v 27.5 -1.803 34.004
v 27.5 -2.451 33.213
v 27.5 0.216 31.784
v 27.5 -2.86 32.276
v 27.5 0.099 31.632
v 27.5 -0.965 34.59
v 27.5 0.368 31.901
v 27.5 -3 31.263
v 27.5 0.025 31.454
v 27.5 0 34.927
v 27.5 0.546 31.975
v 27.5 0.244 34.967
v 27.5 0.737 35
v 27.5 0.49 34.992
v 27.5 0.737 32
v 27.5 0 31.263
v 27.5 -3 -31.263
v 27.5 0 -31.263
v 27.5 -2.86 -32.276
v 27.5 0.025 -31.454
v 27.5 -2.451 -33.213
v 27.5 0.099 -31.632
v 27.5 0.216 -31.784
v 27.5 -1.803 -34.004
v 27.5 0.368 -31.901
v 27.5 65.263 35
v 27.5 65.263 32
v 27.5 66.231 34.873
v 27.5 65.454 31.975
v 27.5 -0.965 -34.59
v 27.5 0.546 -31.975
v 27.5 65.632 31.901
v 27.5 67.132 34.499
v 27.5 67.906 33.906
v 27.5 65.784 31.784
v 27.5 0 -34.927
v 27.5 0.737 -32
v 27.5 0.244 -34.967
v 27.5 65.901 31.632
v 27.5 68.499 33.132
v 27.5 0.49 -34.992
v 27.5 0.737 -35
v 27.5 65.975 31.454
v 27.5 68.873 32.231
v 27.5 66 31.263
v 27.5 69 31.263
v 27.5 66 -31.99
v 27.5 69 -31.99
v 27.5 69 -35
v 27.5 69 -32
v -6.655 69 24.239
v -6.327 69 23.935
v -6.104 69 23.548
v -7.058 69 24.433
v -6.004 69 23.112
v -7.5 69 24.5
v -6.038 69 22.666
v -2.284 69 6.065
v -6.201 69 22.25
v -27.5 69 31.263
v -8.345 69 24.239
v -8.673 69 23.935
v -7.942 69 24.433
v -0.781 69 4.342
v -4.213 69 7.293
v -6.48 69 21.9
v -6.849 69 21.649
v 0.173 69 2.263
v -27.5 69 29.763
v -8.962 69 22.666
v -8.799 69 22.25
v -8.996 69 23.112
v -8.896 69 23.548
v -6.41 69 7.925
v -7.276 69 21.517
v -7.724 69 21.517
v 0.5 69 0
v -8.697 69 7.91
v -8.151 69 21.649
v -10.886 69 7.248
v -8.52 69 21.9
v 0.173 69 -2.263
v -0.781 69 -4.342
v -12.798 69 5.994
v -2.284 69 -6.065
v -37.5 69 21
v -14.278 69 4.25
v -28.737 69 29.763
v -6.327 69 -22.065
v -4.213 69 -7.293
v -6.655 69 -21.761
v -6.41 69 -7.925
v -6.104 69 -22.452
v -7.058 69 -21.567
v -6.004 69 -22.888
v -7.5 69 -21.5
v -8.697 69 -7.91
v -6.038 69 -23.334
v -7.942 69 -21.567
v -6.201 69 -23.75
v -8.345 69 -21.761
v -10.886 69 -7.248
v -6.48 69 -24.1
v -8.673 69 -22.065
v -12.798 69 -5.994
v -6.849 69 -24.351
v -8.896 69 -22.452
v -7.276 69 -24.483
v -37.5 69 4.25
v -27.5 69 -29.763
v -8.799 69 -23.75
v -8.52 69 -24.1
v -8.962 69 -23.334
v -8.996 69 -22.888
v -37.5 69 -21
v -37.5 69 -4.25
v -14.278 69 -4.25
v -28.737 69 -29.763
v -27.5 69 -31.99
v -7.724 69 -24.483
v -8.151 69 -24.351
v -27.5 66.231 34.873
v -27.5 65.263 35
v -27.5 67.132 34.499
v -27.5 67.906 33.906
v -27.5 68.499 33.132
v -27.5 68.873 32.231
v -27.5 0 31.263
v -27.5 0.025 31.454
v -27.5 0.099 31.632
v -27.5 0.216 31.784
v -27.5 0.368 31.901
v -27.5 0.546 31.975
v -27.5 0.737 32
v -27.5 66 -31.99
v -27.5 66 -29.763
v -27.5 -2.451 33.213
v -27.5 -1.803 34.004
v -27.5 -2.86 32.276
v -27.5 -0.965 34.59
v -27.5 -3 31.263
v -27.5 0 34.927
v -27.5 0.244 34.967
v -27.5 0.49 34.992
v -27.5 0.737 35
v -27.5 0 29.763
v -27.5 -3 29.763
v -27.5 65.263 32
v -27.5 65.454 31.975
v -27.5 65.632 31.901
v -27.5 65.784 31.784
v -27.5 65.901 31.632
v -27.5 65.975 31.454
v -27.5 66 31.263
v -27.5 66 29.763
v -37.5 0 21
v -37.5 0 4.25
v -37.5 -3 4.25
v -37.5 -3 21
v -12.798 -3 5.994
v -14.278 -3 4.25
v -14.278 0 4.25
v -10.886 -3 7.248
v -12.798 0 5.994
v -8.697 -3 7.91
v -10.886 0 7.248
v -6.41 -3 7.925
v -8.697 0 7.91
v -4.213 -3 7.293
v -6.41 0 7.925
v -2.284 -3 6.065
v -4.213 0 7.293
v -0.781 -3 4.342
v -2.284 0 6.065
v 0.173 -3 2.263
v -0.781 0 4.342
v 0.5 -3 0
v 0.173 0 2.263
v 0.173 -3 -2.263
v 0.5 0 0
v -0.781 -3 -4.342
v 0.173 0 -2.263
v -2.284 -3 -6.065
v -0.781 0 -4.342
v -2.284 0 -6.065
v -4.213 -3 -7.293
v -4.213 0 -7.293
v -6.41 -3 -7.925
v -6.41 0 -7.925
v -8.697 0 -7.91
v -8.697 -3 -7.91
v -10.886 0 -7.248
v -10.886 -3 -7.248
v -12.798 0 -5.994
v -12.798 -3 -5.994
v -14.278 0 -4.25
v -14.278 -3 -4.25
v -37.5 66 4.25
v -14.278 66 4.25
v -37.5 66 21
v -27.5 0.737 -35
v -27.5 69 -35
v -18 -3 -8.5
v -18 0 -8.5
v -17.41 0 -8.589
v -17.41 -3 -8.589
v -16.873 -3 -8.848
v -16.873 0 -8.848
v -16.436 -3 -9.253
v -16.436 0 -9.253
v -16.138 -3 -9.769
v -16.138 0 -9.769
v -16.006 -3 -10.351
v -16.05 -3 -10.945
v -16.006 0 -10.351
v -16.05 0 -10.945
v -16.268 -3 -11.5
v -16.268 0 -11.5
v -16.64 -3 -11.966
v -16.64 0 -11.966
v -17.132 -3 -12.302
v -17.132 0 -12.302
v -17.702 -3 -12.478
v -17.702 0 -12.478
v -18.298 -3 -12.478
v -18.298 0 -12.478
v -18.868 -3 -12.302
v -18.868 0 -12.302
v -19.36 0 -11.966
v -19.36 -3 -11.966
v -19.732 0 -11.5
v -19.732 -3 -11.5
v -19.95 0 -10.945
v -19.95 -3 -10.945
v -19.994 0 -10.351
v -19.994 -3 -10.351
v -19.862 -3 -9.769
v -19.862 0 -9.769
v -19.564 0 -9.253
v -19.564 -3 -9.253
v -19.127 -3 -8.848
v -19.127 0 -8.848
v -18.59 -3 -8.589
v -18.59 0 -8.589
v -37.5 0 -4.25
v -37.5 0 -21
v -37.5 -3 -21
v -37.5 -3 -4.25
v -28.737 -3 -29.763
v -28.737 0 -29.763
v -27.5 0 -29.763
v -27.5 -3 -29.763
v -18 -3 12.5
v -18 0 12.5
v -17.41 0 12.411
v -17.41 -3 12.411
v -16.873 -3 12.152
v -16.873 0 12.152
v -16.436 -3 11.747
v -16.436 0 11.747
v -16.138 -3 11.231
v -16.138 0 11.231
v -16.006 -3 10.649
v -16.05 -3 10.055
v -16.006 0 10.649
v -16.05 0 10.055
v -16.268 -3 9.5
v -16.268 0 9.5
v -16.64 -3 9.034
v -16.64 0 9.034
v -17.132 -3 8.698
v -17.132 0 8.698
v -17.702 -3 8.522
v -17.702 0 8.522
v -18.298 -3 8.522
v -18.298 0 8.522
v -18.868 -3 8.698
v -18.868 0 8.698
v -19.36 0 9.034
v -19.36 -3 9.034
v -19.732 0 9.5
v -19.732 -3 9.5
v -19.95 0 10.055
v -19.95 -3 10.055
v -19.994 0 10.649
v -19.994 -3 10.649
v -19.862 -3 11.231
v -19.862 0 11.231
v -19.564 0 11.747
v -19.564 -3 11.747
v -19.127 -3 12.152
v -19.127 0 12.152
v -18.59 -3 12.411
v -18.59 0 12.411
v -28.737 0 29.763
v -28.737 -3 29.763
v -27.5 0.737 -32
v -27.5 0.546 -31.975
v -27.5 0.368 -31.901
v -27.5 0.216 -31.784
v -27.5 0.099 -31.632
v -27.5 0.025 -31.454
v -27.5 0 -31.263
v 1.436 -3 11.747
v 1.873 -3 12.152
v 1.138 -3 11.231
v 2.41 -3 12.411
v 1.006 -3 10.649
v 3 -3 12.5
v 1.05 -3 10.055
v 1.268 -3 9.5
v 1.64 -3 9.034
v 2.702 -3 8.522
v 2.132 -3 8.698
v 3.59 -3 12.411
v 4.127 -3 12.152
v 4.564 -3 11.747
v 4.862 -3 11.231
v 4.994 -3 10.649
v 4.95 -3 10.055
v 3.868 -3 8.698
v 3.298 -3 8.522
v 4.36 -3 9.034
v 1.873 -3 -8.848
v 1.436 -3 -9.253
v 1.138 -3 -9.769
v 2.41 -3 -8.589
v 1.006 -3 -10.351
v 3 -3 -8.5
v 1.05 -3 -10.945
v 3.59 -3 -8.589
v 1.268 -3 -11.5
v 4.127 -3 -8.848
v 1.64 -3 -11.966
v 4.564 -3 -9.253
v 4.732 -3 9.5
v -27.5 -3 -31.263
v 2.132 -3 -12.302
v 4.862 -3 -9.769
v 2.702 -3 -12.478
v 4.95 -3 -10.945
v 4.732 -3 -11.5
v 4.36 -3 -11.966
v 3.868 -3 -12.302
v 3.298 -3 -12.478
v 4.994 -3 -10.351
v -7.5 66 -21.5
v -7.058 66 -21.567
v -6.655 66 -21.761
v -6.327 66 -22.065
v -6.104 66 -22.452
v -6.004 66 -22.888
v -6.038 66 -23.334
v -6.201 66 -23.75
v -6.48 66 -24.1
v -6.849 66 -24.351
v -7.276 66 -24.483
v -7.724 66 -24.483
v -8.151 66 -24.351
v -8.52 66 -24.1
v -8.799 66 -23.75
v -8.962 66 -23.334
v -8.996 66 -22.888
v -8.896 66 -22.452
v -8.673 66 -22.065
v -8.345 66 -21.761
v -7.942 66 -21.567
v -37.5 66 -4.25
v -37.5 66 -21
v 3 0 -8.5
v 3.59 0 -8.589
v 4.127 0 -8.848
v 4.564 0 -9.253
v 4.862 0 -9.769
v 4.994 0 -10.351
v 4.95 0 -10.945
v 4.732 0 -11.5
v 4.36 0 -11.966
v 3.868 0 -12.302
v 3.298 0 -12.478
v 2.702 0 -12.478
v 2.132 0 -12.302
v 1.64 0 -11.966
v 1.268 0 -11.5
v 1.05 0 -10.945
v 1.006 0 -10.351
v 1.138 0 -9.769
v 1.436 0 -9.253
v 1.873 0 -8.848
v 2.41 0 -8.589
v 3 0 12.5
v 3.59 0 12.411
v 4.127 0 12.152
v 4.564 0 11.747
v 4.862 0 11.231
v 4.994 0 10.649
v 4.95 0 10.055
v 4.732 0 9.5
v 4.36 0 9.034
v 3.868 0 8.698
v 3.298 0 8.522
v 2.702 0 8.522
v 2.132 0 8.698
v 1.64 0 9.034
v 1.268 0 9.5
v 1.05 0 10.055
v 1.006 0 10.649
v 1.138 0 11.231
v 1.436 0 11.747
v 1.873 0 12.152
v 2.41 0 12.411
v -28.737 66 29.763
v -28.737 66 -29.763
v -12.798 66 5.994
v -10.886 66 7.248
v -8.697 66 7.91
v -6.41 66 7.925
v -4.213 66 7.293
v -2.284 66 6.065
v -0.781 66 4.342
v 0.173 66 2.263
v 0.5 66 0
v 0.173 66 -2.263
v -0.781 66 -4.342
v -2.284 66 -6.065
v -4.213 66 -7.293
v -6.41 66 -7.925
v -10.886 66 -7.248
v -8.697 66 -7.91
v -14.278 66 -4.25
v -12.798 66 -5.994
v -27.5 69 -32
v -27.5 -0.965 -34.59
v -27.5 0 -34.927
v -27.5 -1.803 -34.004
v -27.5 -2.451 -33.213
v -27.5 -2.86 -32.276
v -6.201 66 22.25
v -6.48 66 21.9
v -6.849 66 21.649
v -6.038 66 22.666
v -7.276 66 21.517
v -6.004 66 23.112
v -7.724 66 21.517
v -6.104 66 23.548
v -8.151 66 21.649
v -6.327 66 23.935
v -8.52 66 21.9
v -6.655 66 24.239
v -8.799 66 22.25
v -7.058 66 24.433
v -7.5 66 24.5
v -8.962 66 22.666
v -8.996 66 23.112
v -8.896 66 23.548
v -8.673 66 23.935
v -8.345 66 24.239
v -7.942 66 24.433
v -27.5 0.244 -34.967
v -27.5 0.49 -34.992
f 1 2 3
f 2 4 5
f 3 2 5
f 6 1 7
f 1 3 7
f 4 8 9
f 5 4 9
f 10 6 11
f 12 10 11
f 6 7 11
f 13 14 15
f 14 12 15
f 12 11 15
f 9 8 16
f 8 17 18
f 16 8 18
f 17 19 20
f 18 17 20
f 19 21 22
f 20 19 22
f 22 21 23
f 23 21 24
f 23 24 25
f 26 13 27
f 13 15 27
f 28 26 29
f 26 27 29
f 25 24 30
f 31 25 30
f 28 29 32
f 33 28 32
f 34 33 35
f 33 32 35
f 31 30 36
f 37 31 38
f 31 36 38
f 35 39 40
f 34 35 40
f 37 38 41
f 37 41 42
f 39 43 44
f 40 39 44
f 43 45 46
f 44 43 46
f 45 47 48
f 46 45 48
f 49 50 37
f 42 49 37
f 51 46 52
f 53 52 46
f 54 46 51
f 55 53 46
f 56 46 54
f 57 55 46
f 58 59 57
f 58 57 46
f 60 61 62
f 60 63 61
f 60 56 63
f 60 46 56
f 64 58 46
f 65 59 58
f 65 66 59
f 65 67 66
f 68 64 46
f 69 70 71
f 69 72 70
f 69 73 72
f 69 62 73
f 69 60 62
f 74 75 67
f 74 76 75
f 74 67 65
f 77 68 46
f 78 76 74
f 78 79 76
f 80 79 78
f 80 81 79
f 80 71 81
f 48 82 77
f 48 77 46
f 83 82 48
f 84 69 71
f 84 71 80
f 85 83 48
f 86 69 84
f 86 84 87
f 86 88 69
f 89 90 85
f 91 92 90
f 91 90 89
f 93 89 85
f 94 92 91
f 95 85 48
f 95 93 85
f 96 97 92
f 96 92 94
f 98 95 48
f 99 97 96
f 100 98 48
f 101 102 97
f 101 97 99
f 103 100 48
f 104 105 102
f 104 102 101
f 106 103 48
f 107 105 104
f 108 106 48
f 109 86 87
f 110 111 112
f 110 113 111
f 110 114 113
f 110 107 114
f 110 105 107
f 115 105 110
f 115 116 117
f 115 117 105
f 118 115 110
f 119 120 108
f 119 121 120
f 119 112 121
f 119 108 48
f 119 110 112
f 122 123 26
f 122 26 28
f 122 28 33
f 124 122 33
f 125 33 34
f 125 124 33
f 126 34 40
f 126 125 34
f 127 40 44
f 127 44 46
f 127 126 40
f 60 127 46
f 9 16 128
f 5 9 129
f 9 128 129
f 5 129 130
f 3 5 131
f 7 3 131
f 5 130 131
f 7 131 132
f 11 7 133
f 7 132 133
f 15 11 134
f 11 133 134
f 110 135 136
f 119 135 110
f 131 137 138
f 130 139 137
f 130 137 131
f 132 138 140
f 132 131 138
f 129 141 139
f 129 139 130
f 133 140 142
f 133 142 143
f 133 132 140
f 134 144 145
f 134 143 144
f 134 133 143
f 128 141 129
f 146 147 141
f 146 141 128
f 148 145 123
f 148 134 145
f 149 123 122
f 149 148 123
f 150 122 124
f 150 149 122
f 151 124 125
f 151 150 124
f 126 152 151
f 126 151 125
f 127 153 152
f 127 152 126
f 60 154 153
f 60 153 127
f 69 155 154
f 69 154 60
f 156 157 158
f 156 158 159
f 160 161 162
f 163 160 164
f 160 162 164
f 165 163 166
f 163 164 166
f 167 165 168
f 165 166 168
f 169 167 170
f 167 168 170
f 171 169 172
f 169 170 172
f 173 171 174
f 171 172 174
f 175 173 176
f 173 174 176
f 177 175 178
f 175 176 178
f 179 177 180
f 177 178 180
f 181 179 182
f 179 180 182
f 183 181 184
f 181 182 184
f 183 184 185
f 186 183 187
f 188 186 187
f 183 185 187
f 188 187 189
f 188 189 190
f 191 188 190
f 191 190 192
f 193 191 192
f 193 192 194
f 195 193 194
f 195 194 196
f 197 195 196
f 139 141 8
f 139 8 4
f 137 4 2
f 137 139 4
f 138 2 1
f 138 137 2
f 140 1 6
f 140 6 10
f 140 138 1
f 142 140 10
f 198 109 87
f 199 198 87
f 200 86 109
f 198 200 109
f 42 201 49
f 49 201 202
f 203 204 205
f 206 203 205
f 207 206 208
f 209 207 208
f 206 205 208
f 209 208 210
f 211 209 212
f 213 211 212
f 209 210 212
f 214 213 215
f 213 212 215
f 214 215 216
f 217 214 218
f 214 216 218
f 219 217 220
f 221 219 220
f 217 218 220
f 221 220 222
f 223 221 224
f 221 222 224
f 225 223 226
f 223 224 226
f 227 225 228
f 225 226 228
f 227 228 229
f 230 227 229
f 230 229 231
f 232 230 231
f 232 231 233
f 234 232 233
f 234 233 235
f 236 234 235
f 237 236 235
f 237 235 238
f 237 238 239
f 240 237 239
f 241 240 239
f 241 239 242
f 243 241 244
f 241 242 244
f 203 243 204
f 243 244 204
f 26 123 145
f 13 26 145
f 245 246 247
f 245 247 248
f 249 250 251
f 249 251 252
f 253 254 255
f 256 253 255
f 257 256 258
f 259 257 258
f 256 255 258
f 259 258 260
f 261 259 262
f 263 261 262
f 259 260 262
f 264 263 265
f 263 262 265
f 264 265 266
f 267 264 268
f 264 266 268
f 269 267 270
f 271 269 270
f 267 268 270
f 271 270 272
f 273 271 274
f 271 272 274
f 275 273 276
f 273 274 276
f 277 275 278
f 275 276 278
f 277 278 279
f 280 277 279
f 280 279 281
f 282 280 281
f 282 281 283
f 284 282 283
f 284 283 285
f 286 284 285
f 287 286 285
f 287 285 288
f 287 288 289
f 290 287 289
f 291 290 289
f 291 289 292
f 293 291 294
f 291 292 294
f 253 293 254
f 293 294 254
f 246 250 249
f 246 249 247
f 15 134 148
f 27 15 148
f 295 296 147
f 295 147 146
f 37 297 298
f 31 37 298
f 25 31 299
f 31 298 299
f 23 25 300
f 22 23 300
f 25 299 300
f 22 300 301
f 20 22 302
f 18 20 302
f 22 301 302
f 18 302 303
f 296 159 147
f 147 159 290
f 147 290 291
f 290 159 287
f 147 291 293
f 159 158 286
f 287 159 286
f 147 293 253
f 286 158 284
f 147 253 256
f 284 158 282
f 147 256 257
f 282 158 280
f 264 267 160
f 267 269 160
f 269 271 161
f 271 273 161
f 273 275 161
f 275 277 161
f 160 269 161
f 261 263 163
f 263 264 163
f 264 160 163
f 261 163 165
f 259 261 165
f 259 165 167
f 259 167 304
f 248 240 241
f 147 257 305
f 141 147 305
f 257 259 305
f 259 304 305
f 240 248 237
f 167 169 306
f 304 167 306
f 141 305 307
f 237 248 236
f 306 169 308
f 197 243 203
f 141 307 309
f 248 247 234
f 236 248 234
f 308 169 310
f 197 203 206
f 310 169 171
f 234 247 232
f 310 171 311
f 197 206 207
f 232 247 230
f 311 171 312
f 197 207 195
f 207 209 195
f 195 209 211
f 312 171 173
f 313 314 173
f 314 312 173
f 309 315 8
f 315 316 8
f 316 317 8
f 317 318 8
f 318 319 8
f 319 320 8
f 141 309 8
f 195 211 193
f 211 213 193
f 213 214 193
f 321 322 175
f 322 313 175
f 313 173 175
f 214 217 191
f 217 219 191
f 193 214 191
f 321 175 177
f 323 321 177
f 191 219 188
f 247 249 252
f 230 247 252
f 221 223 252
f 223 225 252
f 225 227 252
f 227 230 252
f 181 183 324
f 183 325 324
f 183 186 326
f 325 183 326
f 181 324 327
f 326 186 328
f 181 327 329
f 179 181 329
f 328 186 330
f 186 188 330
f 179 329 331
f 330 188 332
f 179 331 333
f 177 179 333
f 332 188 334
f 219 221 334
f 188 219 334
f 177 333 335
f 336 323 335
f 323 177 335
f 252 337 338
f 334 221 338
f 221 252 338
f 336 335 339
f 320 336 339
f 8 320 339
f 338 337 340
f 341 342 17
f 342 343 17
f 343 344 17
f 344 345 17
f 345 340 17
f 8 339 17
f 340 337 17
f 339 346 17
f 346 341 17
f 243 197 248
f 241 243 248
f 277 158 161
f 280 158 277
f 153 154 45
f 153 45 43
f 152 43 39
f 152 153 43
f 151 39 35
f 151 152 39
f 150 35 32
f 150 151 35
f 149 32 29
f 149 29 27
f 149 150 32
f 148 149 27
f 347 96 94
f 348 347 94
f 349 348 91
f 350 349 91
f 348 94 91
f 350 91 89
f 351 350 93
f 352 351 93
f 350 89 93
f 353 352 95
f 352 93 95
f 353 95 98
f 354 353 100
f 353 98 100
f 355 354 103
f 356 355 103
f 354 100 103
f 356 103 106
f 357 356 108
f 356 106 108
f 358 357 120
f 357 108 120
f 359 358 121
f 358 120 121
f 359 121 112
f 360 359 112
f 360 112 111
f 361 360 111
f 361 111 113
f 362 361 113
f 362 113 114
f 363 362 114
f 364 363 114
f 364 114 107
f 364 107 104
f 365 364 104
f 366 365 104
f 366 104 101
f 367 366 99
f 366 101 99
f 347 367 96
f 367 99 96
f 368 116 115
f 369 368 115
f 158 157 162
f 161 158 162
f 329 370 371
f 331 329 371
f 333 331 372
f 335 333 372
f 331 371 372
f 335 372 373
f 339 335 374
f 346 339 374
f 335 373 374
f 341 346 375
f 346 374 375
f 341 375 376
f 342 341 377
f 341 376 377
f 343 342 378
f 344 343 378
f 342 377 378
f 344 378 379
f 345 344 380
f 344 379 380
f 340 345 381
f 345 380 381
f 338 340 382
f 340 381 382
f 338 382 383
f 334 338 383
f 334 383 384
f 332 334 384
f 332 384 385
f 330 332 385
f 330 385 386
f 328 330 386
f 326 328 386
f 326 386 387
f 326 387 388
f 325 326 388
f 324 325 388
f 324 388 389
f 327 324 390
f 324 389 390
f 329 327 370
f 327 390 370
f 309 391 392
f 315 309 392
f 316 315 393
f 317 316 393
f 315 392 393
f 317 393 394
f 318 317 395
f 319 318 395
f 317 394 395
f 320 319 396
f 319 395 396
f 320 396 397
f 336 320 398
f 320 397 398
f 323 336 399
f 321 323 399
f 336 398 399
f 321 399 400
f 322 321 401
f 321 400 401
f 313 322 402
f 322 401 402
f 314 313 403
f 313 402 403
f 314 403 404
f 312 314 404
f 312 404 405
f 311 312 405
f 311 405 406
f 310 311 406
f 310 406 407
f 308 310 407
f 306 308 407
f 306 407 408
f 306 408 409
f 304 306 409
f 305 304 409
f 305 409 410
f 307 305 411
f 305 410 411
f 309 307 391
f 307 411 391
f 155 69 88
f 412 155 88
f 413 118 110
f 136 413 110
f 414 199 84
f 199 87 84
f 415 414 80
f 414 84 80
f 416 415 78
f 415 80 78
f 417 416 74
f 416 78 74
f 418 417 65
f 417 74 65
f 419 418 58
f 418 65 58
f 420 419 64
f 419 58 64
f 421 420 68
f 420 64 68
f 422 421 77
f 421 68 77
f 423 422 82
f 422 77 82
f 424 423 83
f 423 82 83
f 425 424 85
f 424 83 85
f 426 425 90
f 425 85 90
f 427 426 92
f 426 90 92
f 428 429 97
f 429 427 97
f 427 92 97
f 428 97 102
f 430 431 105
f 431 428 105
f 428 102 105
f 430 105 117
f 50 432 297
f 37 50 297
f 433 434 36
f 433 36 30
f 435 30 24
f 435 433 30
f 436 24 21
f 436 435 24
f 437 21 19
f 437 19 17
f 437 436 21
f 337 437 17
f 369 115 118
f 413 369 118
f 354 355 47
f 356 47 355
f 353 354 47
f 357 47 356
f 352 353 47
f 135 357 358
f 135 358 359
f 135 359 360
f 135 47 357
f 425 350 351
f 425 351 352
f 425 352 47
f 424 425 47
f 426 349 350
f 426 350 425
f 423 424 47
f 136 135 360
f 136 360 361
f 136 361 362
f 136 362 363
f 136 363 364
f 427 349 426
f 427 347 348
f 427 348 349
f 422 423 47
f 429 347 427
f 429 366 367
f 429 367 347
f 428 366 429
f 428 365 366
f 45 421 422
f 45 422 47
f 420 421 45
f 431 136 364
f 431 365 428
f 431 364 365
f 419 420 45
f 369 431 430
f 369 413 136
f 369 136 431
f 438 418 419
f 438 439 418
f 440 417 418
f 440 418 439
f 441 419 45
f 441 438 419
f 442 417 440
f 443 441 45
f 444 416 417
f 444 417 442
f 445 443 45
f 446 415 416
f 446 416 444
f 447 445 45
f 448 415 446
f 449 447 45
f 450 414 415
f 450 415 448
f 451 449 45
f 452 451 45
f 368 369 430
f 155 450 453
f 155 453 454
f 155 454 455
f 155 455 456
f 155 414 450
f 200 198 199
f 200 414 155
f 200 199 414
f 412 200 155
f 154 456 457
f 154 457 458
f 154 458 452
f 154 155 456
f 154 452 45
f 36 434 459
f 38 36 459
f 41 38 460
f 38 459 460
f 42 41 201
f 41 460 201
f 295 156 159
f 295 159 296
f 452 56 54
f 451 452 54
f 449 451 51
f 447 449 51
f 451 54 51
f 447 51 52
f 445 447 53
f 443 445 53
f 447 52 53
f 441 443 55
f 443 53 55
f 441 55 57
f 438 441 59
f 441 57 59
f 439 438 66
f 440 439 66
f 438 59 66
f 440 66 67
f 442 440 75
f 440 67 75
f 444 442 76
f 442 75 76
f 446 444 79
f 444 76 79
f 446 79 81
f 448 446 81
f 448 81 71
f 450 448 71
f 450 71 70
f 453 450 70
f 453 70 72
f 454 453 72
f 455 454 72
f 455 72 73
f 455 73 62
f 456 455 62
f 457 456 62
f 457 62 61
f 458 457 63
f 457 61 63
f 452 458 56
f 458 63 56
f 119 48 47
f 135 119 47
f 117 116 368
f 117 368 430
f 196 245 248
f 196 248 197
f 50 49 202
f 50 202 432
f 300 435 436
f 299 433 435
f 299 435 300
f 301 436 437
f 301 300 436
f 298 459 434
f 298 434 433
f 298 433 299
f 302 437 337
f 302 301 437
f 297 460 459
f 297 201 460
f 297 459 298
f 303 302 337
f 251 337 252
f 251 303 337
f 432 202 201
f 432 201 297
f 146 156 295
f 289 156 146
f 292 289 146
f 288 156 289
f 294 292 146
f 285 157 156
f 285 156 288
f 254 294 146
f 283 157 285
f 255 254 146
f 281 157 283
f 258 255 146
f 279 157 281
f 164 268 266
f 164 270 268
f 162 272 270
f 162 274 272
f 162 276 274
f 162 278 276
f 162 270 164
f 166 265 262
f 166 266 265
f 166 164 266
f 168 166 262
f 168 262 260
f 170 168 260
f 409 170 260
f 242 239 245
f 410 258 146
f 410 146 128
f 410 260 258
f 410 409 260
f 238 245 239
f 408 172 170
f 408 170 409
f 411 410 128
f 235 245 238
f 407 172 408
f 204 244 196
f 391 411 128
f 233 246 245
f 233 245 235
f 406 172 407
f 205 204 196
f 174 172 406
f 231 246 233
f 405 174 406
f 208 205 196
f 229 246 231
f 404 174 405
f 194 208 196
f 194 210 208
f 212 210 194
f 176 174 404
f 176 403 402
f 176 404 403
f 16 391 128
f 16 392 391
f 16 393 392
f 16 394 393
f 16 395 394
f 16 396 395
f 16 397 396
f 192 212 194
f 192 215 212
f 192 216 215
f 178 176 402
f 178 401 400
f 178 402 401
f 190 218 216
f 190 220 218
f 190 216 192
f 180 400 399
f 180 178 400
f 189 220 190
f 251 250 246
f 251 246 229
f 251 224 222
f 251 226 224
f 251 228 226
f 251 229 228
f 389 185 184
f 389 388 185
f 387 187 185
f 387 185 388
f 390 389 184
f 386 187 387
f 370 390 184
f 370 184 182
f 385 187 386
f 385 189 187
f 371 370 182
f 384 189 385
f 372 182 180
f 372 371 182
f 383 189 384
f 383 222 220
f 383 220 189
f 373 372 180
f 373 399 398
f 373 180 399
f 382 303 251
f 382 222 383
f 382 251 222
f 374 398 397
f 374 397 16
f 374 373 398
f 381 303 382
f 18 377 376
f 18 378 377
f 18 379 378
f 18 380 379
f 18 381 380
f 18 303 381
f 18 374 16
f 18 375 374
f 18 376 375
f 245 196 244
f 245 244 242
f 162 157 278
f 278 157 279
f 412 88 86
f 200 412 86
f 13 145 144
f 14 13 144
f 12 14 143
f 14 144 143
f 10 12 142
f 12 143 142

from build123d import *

# Parameters (mm, degrees)
BASE_FLANGE1_DEPTH           = 3
SKETCH7_R                    = 8
SKETCH7_R_2                  = 2
CUT_EXTRUDE1_DEPTH           = 3
EDGE_FLANGE1_START           = -27.5
EDGE_FLANGE1_DEPTH           = 55
EDGE_FLANGE1_START_2         = -28.7366
EDGE_FLANGE1_2_DEPTH         = 1.2366
EDGE_FLANGE1_3_DEPTH         = 55
EDGE_FLANGE2_STRIP_W         = 13.4732
EDGE_FLANGE2_STRIP_H         = 3
EDGE_FLANGE2_STRIP_CUT_DEPTH = 55
EDGE_FLANGE2_DEPTH           = 55
BOSS_EXTRUDE1_DEPTH          = 3
SKETCH18_R                   = 8
SKETCH18_R_2                 = 1.5
CUT_EXTRUDE2_DEPTH           = 3
SKETCH19_W                   = 24
SKETCH19_H                   = 8.5
CUT_EXTRUDE3_DEPTH           = 72


# Read off the part's stored shape, not the designer's step: Edge-Flange1
# Sheet-metal steps are written as plain solids
with BuildPart() as part:
    # Sketch1 → Base-Flange1 (new body)
    with BuildSketch(Plane(origin=(0, 0, 0), x_dir=(1, 0, 0), z_dir=(0, 1, 0))):
        Polygon((-37.5, 21), (-37.5, -21), (-27.5, -31), (-27.5, -35), (27.5, -35), (27.5, 35), (-27.5, 35), (-27.5, 31), align=None)
    extrude(amount=-BASE_FLANGE1_DEPTH)

    # Sketch7 → Cut-Extrude1 (cut)
    with BuildSketch(Plane(origin=(0, 0, 0), x_dir=(1, 0, 0), z_dir=(0, 1, 0))):
        with Locations(Location((-7.5, 0, 0), (0, 0, 270))):
            Circle(SKETCH7_R)
        with Locations(Location((-18, 10.5, 0), (0, 0, 270))):
            Circle(SKETCH7_R_2)
        with Locations(Location((3, 10.5, 0), (0, 0, 270))):
            Circle(SKETCH7_R_2)
        with Locations(Location((3, -10.5, 0), (0, 0, 270))):
            Circle(SKETCH7_R_2)
        with Locations(Location((-18, -10.5, 0), (0, 0, 270))):
            Circle(SKETCH7_R_2)
    extrude(amount=-CUT_EXTRUDE1_DEPTH, mode=Mode.SUBTRACT)

    # Edge-Flange1 outline → Edge-Flange1 (cut)
    with BuildSketch(Plane.YZ.offset(EDGE_FLANGE1_START)):
        with BuildLine():
            Line((-3, 35), (-3, 31.2634))
            ThreePointArc((-3, 31.2634), (-2.154295979, 33.630867001), (0, 34.926677222))
            Line((0, 34.926677222), (0, 35))
            Line((0, 35), (-3, 35))
        make_face()
        with BuildLine():
            ThreePointArc((0, -34.926677222), (-2.154295979, -33.630867001), (-3, -31.2634))
            Line((-3, -31.2634), (-3, -35))
            Line((-3, -35), (0, -35))
            Line((0, -35), (0, -34.926677222))
        make_face()
    extrude(amount=EDGE_FLANGE1_DEPTH, mode=Mode.SUBTRACT)

    # Edge-Flange1 2 outline → Edge-Flange1 2 (cut)
    with BuildSketch(Plane.YZ.offset(EDGE_FLANGE1_START_2)):
        with BuildLine():
            Line((-3, 29.7634), (0, 29.7634))
            Line((0, 29.7634), (0, 34.926677222))
            ThreePointArc((0, 34.926677222), (-2.154295979, 33.630867001), (-3, 31.2634))
            Line((-3, 31.2634), (-3, 29.7634))
        make_face()
        with BuildLine():
            Line((0, -34.926677222), (0, -29.7634))
            Line((0, -29.7634), (-3, -29.7634))
            Line((-3, -29.7634), (-3, -31.2634))
            ThreePointArc((-3, -31.2634), (-2.154295979, -33.630867001), (0, -34.926677222))
        make_face()
    extrude(amount=EDGE_FLANGE1_2_DEPTH, mode=Mode.SUBTRACT)

    # Edge-Flange1 3 outline → Edge-Flange1 3 (add)
    with BuildSketch(Plane.YZ.offset(EDGE_FLANGE1_START)):
        with BuildLine():
            Line((0, 34.926677222), (0, 31.2634))
            ThreePointArc((0, 31.2634), (0.215745145, 31.784254855), (0.7366, 32))
            Line((0.7366, 32), (69, 32))
            Line((69, 32), (69, 35))
            Line((69, 35), (0.7366, 35))
            ThreePointArc((0.7366, 35), (0.36647982, 34.981624121), (0, 34.926677222))
        make_face()
        with BuildLine():
            ThreePointArc((0.7366, -32), (0.215745145, -31.784254855), (0, -31.2634))
            Line((0, -31.2634), (0, -34.926677222))
            ThreePointArc((0, -34.926677222), (0.36647982, -34.981624121), (0.7366, -35))
            Line((0.7366, -35), (69, -35))
            Line((69, -35), (69, -32))
            Line((69, -32), (0.7366, -32))
        make_face()
    extrude(amount=EDGE_FLANGE1_3_DEPTH)

    # Edge-Flange2 strip (across the edge) → Edge-Flange2 strip cut (cut)
    with BuildSketch(Plane(origin=(-27.5, 69, 32), x_dir=(0, -1, 0), z_dir=(1, 0, 0))):
        with Locations((-3, -1.5)):
            Rectangle(EDGE_FLANGE2_STRIP_W, EDGE_FLANGE2_STRIP_H)
    extrude(amount=EDGE_FLANGE2_STRIP_CUT_DEPTH, mode=Mode.SUBTRACT)

    # Edge-Flange2 section (across the edge) → Edge-Flange2 (add)
    with BuildSketch(Plane(origin=(-27.5, 69, 32), x_dir=(0, -1, 0), z_dir=(1, 0, 0))):
        with BuildLine():
            Line((0, 0.7366), (0, 63.99))
            Line((0, 63.99), (3, 63.99))
            Line((3, 63.99), (3, 0.7366))
            ThreePointArc((3, 0.7366), (3.215745145, 0.215745145), (3.7366, 0))
            Line((3.7366, 0), (3.7366, -3))
            ThreePointArc((3.7366, -3), (1.094424801, -1.905575199), (0, 0.7366))
        make_face()
    extrude(amount=EDGE_FLANGE2_DEPTH)

    # Sketch17 → Boss-Extrude1 (add)
    with BuildSketch(Plane(origin=(0, 69, 0), x_dir=(1, 0, 0), z_dir=(0, 1, 0))):
        Polygon((-27.5, -29.7634), (-28.7366, -29.7634), (-37.5, -21), (-37.5, 21), (-28.7366, 29.7634), (-27.5, 29.7634), align=None)
    extrude(amount=-BOSS_EXTRUDE1_DEPTH)

    # Sketch18 → Cut-Extrude2 (cut)
    with BuildSketch(Plane(origin=(0, 69, 0), x_dir=(1, 0, 0), z_dir=(0, 1, 0))):
        with Locations(Location((-7.5, 0, 0), (0, 0, 270))):
            Circle(SKETCH18_R)
        with Locations(Location((-7.5, 23, 0), (0, 0, 270))):
            Circle(SKETCH18_R_2)
        with Locations(Location((-7.5, -23, 0), (0, 0, 270))):
            Circle(SKETCH18_R_2)
    extrude(amount=-CUT_EXTRUDE2_DEPTH, mode=Mode.SUBTRACT)

    # Sketch19 → Cut-Extrude3 (cut)
    with BuildSketch(Plane(origin=(0, 69, 0), x_dir=(1, 0, 0), z_dir=(0, 1, 0))):
        with Locations((-25.5, 0)):
            Rectangle(SKETCH19_W, SKETCH19_H)
    extrude(amount=-CUT_EXTRUDE3_DEPTH, mode=Mode.SUBTRACT)


solid = part.part
